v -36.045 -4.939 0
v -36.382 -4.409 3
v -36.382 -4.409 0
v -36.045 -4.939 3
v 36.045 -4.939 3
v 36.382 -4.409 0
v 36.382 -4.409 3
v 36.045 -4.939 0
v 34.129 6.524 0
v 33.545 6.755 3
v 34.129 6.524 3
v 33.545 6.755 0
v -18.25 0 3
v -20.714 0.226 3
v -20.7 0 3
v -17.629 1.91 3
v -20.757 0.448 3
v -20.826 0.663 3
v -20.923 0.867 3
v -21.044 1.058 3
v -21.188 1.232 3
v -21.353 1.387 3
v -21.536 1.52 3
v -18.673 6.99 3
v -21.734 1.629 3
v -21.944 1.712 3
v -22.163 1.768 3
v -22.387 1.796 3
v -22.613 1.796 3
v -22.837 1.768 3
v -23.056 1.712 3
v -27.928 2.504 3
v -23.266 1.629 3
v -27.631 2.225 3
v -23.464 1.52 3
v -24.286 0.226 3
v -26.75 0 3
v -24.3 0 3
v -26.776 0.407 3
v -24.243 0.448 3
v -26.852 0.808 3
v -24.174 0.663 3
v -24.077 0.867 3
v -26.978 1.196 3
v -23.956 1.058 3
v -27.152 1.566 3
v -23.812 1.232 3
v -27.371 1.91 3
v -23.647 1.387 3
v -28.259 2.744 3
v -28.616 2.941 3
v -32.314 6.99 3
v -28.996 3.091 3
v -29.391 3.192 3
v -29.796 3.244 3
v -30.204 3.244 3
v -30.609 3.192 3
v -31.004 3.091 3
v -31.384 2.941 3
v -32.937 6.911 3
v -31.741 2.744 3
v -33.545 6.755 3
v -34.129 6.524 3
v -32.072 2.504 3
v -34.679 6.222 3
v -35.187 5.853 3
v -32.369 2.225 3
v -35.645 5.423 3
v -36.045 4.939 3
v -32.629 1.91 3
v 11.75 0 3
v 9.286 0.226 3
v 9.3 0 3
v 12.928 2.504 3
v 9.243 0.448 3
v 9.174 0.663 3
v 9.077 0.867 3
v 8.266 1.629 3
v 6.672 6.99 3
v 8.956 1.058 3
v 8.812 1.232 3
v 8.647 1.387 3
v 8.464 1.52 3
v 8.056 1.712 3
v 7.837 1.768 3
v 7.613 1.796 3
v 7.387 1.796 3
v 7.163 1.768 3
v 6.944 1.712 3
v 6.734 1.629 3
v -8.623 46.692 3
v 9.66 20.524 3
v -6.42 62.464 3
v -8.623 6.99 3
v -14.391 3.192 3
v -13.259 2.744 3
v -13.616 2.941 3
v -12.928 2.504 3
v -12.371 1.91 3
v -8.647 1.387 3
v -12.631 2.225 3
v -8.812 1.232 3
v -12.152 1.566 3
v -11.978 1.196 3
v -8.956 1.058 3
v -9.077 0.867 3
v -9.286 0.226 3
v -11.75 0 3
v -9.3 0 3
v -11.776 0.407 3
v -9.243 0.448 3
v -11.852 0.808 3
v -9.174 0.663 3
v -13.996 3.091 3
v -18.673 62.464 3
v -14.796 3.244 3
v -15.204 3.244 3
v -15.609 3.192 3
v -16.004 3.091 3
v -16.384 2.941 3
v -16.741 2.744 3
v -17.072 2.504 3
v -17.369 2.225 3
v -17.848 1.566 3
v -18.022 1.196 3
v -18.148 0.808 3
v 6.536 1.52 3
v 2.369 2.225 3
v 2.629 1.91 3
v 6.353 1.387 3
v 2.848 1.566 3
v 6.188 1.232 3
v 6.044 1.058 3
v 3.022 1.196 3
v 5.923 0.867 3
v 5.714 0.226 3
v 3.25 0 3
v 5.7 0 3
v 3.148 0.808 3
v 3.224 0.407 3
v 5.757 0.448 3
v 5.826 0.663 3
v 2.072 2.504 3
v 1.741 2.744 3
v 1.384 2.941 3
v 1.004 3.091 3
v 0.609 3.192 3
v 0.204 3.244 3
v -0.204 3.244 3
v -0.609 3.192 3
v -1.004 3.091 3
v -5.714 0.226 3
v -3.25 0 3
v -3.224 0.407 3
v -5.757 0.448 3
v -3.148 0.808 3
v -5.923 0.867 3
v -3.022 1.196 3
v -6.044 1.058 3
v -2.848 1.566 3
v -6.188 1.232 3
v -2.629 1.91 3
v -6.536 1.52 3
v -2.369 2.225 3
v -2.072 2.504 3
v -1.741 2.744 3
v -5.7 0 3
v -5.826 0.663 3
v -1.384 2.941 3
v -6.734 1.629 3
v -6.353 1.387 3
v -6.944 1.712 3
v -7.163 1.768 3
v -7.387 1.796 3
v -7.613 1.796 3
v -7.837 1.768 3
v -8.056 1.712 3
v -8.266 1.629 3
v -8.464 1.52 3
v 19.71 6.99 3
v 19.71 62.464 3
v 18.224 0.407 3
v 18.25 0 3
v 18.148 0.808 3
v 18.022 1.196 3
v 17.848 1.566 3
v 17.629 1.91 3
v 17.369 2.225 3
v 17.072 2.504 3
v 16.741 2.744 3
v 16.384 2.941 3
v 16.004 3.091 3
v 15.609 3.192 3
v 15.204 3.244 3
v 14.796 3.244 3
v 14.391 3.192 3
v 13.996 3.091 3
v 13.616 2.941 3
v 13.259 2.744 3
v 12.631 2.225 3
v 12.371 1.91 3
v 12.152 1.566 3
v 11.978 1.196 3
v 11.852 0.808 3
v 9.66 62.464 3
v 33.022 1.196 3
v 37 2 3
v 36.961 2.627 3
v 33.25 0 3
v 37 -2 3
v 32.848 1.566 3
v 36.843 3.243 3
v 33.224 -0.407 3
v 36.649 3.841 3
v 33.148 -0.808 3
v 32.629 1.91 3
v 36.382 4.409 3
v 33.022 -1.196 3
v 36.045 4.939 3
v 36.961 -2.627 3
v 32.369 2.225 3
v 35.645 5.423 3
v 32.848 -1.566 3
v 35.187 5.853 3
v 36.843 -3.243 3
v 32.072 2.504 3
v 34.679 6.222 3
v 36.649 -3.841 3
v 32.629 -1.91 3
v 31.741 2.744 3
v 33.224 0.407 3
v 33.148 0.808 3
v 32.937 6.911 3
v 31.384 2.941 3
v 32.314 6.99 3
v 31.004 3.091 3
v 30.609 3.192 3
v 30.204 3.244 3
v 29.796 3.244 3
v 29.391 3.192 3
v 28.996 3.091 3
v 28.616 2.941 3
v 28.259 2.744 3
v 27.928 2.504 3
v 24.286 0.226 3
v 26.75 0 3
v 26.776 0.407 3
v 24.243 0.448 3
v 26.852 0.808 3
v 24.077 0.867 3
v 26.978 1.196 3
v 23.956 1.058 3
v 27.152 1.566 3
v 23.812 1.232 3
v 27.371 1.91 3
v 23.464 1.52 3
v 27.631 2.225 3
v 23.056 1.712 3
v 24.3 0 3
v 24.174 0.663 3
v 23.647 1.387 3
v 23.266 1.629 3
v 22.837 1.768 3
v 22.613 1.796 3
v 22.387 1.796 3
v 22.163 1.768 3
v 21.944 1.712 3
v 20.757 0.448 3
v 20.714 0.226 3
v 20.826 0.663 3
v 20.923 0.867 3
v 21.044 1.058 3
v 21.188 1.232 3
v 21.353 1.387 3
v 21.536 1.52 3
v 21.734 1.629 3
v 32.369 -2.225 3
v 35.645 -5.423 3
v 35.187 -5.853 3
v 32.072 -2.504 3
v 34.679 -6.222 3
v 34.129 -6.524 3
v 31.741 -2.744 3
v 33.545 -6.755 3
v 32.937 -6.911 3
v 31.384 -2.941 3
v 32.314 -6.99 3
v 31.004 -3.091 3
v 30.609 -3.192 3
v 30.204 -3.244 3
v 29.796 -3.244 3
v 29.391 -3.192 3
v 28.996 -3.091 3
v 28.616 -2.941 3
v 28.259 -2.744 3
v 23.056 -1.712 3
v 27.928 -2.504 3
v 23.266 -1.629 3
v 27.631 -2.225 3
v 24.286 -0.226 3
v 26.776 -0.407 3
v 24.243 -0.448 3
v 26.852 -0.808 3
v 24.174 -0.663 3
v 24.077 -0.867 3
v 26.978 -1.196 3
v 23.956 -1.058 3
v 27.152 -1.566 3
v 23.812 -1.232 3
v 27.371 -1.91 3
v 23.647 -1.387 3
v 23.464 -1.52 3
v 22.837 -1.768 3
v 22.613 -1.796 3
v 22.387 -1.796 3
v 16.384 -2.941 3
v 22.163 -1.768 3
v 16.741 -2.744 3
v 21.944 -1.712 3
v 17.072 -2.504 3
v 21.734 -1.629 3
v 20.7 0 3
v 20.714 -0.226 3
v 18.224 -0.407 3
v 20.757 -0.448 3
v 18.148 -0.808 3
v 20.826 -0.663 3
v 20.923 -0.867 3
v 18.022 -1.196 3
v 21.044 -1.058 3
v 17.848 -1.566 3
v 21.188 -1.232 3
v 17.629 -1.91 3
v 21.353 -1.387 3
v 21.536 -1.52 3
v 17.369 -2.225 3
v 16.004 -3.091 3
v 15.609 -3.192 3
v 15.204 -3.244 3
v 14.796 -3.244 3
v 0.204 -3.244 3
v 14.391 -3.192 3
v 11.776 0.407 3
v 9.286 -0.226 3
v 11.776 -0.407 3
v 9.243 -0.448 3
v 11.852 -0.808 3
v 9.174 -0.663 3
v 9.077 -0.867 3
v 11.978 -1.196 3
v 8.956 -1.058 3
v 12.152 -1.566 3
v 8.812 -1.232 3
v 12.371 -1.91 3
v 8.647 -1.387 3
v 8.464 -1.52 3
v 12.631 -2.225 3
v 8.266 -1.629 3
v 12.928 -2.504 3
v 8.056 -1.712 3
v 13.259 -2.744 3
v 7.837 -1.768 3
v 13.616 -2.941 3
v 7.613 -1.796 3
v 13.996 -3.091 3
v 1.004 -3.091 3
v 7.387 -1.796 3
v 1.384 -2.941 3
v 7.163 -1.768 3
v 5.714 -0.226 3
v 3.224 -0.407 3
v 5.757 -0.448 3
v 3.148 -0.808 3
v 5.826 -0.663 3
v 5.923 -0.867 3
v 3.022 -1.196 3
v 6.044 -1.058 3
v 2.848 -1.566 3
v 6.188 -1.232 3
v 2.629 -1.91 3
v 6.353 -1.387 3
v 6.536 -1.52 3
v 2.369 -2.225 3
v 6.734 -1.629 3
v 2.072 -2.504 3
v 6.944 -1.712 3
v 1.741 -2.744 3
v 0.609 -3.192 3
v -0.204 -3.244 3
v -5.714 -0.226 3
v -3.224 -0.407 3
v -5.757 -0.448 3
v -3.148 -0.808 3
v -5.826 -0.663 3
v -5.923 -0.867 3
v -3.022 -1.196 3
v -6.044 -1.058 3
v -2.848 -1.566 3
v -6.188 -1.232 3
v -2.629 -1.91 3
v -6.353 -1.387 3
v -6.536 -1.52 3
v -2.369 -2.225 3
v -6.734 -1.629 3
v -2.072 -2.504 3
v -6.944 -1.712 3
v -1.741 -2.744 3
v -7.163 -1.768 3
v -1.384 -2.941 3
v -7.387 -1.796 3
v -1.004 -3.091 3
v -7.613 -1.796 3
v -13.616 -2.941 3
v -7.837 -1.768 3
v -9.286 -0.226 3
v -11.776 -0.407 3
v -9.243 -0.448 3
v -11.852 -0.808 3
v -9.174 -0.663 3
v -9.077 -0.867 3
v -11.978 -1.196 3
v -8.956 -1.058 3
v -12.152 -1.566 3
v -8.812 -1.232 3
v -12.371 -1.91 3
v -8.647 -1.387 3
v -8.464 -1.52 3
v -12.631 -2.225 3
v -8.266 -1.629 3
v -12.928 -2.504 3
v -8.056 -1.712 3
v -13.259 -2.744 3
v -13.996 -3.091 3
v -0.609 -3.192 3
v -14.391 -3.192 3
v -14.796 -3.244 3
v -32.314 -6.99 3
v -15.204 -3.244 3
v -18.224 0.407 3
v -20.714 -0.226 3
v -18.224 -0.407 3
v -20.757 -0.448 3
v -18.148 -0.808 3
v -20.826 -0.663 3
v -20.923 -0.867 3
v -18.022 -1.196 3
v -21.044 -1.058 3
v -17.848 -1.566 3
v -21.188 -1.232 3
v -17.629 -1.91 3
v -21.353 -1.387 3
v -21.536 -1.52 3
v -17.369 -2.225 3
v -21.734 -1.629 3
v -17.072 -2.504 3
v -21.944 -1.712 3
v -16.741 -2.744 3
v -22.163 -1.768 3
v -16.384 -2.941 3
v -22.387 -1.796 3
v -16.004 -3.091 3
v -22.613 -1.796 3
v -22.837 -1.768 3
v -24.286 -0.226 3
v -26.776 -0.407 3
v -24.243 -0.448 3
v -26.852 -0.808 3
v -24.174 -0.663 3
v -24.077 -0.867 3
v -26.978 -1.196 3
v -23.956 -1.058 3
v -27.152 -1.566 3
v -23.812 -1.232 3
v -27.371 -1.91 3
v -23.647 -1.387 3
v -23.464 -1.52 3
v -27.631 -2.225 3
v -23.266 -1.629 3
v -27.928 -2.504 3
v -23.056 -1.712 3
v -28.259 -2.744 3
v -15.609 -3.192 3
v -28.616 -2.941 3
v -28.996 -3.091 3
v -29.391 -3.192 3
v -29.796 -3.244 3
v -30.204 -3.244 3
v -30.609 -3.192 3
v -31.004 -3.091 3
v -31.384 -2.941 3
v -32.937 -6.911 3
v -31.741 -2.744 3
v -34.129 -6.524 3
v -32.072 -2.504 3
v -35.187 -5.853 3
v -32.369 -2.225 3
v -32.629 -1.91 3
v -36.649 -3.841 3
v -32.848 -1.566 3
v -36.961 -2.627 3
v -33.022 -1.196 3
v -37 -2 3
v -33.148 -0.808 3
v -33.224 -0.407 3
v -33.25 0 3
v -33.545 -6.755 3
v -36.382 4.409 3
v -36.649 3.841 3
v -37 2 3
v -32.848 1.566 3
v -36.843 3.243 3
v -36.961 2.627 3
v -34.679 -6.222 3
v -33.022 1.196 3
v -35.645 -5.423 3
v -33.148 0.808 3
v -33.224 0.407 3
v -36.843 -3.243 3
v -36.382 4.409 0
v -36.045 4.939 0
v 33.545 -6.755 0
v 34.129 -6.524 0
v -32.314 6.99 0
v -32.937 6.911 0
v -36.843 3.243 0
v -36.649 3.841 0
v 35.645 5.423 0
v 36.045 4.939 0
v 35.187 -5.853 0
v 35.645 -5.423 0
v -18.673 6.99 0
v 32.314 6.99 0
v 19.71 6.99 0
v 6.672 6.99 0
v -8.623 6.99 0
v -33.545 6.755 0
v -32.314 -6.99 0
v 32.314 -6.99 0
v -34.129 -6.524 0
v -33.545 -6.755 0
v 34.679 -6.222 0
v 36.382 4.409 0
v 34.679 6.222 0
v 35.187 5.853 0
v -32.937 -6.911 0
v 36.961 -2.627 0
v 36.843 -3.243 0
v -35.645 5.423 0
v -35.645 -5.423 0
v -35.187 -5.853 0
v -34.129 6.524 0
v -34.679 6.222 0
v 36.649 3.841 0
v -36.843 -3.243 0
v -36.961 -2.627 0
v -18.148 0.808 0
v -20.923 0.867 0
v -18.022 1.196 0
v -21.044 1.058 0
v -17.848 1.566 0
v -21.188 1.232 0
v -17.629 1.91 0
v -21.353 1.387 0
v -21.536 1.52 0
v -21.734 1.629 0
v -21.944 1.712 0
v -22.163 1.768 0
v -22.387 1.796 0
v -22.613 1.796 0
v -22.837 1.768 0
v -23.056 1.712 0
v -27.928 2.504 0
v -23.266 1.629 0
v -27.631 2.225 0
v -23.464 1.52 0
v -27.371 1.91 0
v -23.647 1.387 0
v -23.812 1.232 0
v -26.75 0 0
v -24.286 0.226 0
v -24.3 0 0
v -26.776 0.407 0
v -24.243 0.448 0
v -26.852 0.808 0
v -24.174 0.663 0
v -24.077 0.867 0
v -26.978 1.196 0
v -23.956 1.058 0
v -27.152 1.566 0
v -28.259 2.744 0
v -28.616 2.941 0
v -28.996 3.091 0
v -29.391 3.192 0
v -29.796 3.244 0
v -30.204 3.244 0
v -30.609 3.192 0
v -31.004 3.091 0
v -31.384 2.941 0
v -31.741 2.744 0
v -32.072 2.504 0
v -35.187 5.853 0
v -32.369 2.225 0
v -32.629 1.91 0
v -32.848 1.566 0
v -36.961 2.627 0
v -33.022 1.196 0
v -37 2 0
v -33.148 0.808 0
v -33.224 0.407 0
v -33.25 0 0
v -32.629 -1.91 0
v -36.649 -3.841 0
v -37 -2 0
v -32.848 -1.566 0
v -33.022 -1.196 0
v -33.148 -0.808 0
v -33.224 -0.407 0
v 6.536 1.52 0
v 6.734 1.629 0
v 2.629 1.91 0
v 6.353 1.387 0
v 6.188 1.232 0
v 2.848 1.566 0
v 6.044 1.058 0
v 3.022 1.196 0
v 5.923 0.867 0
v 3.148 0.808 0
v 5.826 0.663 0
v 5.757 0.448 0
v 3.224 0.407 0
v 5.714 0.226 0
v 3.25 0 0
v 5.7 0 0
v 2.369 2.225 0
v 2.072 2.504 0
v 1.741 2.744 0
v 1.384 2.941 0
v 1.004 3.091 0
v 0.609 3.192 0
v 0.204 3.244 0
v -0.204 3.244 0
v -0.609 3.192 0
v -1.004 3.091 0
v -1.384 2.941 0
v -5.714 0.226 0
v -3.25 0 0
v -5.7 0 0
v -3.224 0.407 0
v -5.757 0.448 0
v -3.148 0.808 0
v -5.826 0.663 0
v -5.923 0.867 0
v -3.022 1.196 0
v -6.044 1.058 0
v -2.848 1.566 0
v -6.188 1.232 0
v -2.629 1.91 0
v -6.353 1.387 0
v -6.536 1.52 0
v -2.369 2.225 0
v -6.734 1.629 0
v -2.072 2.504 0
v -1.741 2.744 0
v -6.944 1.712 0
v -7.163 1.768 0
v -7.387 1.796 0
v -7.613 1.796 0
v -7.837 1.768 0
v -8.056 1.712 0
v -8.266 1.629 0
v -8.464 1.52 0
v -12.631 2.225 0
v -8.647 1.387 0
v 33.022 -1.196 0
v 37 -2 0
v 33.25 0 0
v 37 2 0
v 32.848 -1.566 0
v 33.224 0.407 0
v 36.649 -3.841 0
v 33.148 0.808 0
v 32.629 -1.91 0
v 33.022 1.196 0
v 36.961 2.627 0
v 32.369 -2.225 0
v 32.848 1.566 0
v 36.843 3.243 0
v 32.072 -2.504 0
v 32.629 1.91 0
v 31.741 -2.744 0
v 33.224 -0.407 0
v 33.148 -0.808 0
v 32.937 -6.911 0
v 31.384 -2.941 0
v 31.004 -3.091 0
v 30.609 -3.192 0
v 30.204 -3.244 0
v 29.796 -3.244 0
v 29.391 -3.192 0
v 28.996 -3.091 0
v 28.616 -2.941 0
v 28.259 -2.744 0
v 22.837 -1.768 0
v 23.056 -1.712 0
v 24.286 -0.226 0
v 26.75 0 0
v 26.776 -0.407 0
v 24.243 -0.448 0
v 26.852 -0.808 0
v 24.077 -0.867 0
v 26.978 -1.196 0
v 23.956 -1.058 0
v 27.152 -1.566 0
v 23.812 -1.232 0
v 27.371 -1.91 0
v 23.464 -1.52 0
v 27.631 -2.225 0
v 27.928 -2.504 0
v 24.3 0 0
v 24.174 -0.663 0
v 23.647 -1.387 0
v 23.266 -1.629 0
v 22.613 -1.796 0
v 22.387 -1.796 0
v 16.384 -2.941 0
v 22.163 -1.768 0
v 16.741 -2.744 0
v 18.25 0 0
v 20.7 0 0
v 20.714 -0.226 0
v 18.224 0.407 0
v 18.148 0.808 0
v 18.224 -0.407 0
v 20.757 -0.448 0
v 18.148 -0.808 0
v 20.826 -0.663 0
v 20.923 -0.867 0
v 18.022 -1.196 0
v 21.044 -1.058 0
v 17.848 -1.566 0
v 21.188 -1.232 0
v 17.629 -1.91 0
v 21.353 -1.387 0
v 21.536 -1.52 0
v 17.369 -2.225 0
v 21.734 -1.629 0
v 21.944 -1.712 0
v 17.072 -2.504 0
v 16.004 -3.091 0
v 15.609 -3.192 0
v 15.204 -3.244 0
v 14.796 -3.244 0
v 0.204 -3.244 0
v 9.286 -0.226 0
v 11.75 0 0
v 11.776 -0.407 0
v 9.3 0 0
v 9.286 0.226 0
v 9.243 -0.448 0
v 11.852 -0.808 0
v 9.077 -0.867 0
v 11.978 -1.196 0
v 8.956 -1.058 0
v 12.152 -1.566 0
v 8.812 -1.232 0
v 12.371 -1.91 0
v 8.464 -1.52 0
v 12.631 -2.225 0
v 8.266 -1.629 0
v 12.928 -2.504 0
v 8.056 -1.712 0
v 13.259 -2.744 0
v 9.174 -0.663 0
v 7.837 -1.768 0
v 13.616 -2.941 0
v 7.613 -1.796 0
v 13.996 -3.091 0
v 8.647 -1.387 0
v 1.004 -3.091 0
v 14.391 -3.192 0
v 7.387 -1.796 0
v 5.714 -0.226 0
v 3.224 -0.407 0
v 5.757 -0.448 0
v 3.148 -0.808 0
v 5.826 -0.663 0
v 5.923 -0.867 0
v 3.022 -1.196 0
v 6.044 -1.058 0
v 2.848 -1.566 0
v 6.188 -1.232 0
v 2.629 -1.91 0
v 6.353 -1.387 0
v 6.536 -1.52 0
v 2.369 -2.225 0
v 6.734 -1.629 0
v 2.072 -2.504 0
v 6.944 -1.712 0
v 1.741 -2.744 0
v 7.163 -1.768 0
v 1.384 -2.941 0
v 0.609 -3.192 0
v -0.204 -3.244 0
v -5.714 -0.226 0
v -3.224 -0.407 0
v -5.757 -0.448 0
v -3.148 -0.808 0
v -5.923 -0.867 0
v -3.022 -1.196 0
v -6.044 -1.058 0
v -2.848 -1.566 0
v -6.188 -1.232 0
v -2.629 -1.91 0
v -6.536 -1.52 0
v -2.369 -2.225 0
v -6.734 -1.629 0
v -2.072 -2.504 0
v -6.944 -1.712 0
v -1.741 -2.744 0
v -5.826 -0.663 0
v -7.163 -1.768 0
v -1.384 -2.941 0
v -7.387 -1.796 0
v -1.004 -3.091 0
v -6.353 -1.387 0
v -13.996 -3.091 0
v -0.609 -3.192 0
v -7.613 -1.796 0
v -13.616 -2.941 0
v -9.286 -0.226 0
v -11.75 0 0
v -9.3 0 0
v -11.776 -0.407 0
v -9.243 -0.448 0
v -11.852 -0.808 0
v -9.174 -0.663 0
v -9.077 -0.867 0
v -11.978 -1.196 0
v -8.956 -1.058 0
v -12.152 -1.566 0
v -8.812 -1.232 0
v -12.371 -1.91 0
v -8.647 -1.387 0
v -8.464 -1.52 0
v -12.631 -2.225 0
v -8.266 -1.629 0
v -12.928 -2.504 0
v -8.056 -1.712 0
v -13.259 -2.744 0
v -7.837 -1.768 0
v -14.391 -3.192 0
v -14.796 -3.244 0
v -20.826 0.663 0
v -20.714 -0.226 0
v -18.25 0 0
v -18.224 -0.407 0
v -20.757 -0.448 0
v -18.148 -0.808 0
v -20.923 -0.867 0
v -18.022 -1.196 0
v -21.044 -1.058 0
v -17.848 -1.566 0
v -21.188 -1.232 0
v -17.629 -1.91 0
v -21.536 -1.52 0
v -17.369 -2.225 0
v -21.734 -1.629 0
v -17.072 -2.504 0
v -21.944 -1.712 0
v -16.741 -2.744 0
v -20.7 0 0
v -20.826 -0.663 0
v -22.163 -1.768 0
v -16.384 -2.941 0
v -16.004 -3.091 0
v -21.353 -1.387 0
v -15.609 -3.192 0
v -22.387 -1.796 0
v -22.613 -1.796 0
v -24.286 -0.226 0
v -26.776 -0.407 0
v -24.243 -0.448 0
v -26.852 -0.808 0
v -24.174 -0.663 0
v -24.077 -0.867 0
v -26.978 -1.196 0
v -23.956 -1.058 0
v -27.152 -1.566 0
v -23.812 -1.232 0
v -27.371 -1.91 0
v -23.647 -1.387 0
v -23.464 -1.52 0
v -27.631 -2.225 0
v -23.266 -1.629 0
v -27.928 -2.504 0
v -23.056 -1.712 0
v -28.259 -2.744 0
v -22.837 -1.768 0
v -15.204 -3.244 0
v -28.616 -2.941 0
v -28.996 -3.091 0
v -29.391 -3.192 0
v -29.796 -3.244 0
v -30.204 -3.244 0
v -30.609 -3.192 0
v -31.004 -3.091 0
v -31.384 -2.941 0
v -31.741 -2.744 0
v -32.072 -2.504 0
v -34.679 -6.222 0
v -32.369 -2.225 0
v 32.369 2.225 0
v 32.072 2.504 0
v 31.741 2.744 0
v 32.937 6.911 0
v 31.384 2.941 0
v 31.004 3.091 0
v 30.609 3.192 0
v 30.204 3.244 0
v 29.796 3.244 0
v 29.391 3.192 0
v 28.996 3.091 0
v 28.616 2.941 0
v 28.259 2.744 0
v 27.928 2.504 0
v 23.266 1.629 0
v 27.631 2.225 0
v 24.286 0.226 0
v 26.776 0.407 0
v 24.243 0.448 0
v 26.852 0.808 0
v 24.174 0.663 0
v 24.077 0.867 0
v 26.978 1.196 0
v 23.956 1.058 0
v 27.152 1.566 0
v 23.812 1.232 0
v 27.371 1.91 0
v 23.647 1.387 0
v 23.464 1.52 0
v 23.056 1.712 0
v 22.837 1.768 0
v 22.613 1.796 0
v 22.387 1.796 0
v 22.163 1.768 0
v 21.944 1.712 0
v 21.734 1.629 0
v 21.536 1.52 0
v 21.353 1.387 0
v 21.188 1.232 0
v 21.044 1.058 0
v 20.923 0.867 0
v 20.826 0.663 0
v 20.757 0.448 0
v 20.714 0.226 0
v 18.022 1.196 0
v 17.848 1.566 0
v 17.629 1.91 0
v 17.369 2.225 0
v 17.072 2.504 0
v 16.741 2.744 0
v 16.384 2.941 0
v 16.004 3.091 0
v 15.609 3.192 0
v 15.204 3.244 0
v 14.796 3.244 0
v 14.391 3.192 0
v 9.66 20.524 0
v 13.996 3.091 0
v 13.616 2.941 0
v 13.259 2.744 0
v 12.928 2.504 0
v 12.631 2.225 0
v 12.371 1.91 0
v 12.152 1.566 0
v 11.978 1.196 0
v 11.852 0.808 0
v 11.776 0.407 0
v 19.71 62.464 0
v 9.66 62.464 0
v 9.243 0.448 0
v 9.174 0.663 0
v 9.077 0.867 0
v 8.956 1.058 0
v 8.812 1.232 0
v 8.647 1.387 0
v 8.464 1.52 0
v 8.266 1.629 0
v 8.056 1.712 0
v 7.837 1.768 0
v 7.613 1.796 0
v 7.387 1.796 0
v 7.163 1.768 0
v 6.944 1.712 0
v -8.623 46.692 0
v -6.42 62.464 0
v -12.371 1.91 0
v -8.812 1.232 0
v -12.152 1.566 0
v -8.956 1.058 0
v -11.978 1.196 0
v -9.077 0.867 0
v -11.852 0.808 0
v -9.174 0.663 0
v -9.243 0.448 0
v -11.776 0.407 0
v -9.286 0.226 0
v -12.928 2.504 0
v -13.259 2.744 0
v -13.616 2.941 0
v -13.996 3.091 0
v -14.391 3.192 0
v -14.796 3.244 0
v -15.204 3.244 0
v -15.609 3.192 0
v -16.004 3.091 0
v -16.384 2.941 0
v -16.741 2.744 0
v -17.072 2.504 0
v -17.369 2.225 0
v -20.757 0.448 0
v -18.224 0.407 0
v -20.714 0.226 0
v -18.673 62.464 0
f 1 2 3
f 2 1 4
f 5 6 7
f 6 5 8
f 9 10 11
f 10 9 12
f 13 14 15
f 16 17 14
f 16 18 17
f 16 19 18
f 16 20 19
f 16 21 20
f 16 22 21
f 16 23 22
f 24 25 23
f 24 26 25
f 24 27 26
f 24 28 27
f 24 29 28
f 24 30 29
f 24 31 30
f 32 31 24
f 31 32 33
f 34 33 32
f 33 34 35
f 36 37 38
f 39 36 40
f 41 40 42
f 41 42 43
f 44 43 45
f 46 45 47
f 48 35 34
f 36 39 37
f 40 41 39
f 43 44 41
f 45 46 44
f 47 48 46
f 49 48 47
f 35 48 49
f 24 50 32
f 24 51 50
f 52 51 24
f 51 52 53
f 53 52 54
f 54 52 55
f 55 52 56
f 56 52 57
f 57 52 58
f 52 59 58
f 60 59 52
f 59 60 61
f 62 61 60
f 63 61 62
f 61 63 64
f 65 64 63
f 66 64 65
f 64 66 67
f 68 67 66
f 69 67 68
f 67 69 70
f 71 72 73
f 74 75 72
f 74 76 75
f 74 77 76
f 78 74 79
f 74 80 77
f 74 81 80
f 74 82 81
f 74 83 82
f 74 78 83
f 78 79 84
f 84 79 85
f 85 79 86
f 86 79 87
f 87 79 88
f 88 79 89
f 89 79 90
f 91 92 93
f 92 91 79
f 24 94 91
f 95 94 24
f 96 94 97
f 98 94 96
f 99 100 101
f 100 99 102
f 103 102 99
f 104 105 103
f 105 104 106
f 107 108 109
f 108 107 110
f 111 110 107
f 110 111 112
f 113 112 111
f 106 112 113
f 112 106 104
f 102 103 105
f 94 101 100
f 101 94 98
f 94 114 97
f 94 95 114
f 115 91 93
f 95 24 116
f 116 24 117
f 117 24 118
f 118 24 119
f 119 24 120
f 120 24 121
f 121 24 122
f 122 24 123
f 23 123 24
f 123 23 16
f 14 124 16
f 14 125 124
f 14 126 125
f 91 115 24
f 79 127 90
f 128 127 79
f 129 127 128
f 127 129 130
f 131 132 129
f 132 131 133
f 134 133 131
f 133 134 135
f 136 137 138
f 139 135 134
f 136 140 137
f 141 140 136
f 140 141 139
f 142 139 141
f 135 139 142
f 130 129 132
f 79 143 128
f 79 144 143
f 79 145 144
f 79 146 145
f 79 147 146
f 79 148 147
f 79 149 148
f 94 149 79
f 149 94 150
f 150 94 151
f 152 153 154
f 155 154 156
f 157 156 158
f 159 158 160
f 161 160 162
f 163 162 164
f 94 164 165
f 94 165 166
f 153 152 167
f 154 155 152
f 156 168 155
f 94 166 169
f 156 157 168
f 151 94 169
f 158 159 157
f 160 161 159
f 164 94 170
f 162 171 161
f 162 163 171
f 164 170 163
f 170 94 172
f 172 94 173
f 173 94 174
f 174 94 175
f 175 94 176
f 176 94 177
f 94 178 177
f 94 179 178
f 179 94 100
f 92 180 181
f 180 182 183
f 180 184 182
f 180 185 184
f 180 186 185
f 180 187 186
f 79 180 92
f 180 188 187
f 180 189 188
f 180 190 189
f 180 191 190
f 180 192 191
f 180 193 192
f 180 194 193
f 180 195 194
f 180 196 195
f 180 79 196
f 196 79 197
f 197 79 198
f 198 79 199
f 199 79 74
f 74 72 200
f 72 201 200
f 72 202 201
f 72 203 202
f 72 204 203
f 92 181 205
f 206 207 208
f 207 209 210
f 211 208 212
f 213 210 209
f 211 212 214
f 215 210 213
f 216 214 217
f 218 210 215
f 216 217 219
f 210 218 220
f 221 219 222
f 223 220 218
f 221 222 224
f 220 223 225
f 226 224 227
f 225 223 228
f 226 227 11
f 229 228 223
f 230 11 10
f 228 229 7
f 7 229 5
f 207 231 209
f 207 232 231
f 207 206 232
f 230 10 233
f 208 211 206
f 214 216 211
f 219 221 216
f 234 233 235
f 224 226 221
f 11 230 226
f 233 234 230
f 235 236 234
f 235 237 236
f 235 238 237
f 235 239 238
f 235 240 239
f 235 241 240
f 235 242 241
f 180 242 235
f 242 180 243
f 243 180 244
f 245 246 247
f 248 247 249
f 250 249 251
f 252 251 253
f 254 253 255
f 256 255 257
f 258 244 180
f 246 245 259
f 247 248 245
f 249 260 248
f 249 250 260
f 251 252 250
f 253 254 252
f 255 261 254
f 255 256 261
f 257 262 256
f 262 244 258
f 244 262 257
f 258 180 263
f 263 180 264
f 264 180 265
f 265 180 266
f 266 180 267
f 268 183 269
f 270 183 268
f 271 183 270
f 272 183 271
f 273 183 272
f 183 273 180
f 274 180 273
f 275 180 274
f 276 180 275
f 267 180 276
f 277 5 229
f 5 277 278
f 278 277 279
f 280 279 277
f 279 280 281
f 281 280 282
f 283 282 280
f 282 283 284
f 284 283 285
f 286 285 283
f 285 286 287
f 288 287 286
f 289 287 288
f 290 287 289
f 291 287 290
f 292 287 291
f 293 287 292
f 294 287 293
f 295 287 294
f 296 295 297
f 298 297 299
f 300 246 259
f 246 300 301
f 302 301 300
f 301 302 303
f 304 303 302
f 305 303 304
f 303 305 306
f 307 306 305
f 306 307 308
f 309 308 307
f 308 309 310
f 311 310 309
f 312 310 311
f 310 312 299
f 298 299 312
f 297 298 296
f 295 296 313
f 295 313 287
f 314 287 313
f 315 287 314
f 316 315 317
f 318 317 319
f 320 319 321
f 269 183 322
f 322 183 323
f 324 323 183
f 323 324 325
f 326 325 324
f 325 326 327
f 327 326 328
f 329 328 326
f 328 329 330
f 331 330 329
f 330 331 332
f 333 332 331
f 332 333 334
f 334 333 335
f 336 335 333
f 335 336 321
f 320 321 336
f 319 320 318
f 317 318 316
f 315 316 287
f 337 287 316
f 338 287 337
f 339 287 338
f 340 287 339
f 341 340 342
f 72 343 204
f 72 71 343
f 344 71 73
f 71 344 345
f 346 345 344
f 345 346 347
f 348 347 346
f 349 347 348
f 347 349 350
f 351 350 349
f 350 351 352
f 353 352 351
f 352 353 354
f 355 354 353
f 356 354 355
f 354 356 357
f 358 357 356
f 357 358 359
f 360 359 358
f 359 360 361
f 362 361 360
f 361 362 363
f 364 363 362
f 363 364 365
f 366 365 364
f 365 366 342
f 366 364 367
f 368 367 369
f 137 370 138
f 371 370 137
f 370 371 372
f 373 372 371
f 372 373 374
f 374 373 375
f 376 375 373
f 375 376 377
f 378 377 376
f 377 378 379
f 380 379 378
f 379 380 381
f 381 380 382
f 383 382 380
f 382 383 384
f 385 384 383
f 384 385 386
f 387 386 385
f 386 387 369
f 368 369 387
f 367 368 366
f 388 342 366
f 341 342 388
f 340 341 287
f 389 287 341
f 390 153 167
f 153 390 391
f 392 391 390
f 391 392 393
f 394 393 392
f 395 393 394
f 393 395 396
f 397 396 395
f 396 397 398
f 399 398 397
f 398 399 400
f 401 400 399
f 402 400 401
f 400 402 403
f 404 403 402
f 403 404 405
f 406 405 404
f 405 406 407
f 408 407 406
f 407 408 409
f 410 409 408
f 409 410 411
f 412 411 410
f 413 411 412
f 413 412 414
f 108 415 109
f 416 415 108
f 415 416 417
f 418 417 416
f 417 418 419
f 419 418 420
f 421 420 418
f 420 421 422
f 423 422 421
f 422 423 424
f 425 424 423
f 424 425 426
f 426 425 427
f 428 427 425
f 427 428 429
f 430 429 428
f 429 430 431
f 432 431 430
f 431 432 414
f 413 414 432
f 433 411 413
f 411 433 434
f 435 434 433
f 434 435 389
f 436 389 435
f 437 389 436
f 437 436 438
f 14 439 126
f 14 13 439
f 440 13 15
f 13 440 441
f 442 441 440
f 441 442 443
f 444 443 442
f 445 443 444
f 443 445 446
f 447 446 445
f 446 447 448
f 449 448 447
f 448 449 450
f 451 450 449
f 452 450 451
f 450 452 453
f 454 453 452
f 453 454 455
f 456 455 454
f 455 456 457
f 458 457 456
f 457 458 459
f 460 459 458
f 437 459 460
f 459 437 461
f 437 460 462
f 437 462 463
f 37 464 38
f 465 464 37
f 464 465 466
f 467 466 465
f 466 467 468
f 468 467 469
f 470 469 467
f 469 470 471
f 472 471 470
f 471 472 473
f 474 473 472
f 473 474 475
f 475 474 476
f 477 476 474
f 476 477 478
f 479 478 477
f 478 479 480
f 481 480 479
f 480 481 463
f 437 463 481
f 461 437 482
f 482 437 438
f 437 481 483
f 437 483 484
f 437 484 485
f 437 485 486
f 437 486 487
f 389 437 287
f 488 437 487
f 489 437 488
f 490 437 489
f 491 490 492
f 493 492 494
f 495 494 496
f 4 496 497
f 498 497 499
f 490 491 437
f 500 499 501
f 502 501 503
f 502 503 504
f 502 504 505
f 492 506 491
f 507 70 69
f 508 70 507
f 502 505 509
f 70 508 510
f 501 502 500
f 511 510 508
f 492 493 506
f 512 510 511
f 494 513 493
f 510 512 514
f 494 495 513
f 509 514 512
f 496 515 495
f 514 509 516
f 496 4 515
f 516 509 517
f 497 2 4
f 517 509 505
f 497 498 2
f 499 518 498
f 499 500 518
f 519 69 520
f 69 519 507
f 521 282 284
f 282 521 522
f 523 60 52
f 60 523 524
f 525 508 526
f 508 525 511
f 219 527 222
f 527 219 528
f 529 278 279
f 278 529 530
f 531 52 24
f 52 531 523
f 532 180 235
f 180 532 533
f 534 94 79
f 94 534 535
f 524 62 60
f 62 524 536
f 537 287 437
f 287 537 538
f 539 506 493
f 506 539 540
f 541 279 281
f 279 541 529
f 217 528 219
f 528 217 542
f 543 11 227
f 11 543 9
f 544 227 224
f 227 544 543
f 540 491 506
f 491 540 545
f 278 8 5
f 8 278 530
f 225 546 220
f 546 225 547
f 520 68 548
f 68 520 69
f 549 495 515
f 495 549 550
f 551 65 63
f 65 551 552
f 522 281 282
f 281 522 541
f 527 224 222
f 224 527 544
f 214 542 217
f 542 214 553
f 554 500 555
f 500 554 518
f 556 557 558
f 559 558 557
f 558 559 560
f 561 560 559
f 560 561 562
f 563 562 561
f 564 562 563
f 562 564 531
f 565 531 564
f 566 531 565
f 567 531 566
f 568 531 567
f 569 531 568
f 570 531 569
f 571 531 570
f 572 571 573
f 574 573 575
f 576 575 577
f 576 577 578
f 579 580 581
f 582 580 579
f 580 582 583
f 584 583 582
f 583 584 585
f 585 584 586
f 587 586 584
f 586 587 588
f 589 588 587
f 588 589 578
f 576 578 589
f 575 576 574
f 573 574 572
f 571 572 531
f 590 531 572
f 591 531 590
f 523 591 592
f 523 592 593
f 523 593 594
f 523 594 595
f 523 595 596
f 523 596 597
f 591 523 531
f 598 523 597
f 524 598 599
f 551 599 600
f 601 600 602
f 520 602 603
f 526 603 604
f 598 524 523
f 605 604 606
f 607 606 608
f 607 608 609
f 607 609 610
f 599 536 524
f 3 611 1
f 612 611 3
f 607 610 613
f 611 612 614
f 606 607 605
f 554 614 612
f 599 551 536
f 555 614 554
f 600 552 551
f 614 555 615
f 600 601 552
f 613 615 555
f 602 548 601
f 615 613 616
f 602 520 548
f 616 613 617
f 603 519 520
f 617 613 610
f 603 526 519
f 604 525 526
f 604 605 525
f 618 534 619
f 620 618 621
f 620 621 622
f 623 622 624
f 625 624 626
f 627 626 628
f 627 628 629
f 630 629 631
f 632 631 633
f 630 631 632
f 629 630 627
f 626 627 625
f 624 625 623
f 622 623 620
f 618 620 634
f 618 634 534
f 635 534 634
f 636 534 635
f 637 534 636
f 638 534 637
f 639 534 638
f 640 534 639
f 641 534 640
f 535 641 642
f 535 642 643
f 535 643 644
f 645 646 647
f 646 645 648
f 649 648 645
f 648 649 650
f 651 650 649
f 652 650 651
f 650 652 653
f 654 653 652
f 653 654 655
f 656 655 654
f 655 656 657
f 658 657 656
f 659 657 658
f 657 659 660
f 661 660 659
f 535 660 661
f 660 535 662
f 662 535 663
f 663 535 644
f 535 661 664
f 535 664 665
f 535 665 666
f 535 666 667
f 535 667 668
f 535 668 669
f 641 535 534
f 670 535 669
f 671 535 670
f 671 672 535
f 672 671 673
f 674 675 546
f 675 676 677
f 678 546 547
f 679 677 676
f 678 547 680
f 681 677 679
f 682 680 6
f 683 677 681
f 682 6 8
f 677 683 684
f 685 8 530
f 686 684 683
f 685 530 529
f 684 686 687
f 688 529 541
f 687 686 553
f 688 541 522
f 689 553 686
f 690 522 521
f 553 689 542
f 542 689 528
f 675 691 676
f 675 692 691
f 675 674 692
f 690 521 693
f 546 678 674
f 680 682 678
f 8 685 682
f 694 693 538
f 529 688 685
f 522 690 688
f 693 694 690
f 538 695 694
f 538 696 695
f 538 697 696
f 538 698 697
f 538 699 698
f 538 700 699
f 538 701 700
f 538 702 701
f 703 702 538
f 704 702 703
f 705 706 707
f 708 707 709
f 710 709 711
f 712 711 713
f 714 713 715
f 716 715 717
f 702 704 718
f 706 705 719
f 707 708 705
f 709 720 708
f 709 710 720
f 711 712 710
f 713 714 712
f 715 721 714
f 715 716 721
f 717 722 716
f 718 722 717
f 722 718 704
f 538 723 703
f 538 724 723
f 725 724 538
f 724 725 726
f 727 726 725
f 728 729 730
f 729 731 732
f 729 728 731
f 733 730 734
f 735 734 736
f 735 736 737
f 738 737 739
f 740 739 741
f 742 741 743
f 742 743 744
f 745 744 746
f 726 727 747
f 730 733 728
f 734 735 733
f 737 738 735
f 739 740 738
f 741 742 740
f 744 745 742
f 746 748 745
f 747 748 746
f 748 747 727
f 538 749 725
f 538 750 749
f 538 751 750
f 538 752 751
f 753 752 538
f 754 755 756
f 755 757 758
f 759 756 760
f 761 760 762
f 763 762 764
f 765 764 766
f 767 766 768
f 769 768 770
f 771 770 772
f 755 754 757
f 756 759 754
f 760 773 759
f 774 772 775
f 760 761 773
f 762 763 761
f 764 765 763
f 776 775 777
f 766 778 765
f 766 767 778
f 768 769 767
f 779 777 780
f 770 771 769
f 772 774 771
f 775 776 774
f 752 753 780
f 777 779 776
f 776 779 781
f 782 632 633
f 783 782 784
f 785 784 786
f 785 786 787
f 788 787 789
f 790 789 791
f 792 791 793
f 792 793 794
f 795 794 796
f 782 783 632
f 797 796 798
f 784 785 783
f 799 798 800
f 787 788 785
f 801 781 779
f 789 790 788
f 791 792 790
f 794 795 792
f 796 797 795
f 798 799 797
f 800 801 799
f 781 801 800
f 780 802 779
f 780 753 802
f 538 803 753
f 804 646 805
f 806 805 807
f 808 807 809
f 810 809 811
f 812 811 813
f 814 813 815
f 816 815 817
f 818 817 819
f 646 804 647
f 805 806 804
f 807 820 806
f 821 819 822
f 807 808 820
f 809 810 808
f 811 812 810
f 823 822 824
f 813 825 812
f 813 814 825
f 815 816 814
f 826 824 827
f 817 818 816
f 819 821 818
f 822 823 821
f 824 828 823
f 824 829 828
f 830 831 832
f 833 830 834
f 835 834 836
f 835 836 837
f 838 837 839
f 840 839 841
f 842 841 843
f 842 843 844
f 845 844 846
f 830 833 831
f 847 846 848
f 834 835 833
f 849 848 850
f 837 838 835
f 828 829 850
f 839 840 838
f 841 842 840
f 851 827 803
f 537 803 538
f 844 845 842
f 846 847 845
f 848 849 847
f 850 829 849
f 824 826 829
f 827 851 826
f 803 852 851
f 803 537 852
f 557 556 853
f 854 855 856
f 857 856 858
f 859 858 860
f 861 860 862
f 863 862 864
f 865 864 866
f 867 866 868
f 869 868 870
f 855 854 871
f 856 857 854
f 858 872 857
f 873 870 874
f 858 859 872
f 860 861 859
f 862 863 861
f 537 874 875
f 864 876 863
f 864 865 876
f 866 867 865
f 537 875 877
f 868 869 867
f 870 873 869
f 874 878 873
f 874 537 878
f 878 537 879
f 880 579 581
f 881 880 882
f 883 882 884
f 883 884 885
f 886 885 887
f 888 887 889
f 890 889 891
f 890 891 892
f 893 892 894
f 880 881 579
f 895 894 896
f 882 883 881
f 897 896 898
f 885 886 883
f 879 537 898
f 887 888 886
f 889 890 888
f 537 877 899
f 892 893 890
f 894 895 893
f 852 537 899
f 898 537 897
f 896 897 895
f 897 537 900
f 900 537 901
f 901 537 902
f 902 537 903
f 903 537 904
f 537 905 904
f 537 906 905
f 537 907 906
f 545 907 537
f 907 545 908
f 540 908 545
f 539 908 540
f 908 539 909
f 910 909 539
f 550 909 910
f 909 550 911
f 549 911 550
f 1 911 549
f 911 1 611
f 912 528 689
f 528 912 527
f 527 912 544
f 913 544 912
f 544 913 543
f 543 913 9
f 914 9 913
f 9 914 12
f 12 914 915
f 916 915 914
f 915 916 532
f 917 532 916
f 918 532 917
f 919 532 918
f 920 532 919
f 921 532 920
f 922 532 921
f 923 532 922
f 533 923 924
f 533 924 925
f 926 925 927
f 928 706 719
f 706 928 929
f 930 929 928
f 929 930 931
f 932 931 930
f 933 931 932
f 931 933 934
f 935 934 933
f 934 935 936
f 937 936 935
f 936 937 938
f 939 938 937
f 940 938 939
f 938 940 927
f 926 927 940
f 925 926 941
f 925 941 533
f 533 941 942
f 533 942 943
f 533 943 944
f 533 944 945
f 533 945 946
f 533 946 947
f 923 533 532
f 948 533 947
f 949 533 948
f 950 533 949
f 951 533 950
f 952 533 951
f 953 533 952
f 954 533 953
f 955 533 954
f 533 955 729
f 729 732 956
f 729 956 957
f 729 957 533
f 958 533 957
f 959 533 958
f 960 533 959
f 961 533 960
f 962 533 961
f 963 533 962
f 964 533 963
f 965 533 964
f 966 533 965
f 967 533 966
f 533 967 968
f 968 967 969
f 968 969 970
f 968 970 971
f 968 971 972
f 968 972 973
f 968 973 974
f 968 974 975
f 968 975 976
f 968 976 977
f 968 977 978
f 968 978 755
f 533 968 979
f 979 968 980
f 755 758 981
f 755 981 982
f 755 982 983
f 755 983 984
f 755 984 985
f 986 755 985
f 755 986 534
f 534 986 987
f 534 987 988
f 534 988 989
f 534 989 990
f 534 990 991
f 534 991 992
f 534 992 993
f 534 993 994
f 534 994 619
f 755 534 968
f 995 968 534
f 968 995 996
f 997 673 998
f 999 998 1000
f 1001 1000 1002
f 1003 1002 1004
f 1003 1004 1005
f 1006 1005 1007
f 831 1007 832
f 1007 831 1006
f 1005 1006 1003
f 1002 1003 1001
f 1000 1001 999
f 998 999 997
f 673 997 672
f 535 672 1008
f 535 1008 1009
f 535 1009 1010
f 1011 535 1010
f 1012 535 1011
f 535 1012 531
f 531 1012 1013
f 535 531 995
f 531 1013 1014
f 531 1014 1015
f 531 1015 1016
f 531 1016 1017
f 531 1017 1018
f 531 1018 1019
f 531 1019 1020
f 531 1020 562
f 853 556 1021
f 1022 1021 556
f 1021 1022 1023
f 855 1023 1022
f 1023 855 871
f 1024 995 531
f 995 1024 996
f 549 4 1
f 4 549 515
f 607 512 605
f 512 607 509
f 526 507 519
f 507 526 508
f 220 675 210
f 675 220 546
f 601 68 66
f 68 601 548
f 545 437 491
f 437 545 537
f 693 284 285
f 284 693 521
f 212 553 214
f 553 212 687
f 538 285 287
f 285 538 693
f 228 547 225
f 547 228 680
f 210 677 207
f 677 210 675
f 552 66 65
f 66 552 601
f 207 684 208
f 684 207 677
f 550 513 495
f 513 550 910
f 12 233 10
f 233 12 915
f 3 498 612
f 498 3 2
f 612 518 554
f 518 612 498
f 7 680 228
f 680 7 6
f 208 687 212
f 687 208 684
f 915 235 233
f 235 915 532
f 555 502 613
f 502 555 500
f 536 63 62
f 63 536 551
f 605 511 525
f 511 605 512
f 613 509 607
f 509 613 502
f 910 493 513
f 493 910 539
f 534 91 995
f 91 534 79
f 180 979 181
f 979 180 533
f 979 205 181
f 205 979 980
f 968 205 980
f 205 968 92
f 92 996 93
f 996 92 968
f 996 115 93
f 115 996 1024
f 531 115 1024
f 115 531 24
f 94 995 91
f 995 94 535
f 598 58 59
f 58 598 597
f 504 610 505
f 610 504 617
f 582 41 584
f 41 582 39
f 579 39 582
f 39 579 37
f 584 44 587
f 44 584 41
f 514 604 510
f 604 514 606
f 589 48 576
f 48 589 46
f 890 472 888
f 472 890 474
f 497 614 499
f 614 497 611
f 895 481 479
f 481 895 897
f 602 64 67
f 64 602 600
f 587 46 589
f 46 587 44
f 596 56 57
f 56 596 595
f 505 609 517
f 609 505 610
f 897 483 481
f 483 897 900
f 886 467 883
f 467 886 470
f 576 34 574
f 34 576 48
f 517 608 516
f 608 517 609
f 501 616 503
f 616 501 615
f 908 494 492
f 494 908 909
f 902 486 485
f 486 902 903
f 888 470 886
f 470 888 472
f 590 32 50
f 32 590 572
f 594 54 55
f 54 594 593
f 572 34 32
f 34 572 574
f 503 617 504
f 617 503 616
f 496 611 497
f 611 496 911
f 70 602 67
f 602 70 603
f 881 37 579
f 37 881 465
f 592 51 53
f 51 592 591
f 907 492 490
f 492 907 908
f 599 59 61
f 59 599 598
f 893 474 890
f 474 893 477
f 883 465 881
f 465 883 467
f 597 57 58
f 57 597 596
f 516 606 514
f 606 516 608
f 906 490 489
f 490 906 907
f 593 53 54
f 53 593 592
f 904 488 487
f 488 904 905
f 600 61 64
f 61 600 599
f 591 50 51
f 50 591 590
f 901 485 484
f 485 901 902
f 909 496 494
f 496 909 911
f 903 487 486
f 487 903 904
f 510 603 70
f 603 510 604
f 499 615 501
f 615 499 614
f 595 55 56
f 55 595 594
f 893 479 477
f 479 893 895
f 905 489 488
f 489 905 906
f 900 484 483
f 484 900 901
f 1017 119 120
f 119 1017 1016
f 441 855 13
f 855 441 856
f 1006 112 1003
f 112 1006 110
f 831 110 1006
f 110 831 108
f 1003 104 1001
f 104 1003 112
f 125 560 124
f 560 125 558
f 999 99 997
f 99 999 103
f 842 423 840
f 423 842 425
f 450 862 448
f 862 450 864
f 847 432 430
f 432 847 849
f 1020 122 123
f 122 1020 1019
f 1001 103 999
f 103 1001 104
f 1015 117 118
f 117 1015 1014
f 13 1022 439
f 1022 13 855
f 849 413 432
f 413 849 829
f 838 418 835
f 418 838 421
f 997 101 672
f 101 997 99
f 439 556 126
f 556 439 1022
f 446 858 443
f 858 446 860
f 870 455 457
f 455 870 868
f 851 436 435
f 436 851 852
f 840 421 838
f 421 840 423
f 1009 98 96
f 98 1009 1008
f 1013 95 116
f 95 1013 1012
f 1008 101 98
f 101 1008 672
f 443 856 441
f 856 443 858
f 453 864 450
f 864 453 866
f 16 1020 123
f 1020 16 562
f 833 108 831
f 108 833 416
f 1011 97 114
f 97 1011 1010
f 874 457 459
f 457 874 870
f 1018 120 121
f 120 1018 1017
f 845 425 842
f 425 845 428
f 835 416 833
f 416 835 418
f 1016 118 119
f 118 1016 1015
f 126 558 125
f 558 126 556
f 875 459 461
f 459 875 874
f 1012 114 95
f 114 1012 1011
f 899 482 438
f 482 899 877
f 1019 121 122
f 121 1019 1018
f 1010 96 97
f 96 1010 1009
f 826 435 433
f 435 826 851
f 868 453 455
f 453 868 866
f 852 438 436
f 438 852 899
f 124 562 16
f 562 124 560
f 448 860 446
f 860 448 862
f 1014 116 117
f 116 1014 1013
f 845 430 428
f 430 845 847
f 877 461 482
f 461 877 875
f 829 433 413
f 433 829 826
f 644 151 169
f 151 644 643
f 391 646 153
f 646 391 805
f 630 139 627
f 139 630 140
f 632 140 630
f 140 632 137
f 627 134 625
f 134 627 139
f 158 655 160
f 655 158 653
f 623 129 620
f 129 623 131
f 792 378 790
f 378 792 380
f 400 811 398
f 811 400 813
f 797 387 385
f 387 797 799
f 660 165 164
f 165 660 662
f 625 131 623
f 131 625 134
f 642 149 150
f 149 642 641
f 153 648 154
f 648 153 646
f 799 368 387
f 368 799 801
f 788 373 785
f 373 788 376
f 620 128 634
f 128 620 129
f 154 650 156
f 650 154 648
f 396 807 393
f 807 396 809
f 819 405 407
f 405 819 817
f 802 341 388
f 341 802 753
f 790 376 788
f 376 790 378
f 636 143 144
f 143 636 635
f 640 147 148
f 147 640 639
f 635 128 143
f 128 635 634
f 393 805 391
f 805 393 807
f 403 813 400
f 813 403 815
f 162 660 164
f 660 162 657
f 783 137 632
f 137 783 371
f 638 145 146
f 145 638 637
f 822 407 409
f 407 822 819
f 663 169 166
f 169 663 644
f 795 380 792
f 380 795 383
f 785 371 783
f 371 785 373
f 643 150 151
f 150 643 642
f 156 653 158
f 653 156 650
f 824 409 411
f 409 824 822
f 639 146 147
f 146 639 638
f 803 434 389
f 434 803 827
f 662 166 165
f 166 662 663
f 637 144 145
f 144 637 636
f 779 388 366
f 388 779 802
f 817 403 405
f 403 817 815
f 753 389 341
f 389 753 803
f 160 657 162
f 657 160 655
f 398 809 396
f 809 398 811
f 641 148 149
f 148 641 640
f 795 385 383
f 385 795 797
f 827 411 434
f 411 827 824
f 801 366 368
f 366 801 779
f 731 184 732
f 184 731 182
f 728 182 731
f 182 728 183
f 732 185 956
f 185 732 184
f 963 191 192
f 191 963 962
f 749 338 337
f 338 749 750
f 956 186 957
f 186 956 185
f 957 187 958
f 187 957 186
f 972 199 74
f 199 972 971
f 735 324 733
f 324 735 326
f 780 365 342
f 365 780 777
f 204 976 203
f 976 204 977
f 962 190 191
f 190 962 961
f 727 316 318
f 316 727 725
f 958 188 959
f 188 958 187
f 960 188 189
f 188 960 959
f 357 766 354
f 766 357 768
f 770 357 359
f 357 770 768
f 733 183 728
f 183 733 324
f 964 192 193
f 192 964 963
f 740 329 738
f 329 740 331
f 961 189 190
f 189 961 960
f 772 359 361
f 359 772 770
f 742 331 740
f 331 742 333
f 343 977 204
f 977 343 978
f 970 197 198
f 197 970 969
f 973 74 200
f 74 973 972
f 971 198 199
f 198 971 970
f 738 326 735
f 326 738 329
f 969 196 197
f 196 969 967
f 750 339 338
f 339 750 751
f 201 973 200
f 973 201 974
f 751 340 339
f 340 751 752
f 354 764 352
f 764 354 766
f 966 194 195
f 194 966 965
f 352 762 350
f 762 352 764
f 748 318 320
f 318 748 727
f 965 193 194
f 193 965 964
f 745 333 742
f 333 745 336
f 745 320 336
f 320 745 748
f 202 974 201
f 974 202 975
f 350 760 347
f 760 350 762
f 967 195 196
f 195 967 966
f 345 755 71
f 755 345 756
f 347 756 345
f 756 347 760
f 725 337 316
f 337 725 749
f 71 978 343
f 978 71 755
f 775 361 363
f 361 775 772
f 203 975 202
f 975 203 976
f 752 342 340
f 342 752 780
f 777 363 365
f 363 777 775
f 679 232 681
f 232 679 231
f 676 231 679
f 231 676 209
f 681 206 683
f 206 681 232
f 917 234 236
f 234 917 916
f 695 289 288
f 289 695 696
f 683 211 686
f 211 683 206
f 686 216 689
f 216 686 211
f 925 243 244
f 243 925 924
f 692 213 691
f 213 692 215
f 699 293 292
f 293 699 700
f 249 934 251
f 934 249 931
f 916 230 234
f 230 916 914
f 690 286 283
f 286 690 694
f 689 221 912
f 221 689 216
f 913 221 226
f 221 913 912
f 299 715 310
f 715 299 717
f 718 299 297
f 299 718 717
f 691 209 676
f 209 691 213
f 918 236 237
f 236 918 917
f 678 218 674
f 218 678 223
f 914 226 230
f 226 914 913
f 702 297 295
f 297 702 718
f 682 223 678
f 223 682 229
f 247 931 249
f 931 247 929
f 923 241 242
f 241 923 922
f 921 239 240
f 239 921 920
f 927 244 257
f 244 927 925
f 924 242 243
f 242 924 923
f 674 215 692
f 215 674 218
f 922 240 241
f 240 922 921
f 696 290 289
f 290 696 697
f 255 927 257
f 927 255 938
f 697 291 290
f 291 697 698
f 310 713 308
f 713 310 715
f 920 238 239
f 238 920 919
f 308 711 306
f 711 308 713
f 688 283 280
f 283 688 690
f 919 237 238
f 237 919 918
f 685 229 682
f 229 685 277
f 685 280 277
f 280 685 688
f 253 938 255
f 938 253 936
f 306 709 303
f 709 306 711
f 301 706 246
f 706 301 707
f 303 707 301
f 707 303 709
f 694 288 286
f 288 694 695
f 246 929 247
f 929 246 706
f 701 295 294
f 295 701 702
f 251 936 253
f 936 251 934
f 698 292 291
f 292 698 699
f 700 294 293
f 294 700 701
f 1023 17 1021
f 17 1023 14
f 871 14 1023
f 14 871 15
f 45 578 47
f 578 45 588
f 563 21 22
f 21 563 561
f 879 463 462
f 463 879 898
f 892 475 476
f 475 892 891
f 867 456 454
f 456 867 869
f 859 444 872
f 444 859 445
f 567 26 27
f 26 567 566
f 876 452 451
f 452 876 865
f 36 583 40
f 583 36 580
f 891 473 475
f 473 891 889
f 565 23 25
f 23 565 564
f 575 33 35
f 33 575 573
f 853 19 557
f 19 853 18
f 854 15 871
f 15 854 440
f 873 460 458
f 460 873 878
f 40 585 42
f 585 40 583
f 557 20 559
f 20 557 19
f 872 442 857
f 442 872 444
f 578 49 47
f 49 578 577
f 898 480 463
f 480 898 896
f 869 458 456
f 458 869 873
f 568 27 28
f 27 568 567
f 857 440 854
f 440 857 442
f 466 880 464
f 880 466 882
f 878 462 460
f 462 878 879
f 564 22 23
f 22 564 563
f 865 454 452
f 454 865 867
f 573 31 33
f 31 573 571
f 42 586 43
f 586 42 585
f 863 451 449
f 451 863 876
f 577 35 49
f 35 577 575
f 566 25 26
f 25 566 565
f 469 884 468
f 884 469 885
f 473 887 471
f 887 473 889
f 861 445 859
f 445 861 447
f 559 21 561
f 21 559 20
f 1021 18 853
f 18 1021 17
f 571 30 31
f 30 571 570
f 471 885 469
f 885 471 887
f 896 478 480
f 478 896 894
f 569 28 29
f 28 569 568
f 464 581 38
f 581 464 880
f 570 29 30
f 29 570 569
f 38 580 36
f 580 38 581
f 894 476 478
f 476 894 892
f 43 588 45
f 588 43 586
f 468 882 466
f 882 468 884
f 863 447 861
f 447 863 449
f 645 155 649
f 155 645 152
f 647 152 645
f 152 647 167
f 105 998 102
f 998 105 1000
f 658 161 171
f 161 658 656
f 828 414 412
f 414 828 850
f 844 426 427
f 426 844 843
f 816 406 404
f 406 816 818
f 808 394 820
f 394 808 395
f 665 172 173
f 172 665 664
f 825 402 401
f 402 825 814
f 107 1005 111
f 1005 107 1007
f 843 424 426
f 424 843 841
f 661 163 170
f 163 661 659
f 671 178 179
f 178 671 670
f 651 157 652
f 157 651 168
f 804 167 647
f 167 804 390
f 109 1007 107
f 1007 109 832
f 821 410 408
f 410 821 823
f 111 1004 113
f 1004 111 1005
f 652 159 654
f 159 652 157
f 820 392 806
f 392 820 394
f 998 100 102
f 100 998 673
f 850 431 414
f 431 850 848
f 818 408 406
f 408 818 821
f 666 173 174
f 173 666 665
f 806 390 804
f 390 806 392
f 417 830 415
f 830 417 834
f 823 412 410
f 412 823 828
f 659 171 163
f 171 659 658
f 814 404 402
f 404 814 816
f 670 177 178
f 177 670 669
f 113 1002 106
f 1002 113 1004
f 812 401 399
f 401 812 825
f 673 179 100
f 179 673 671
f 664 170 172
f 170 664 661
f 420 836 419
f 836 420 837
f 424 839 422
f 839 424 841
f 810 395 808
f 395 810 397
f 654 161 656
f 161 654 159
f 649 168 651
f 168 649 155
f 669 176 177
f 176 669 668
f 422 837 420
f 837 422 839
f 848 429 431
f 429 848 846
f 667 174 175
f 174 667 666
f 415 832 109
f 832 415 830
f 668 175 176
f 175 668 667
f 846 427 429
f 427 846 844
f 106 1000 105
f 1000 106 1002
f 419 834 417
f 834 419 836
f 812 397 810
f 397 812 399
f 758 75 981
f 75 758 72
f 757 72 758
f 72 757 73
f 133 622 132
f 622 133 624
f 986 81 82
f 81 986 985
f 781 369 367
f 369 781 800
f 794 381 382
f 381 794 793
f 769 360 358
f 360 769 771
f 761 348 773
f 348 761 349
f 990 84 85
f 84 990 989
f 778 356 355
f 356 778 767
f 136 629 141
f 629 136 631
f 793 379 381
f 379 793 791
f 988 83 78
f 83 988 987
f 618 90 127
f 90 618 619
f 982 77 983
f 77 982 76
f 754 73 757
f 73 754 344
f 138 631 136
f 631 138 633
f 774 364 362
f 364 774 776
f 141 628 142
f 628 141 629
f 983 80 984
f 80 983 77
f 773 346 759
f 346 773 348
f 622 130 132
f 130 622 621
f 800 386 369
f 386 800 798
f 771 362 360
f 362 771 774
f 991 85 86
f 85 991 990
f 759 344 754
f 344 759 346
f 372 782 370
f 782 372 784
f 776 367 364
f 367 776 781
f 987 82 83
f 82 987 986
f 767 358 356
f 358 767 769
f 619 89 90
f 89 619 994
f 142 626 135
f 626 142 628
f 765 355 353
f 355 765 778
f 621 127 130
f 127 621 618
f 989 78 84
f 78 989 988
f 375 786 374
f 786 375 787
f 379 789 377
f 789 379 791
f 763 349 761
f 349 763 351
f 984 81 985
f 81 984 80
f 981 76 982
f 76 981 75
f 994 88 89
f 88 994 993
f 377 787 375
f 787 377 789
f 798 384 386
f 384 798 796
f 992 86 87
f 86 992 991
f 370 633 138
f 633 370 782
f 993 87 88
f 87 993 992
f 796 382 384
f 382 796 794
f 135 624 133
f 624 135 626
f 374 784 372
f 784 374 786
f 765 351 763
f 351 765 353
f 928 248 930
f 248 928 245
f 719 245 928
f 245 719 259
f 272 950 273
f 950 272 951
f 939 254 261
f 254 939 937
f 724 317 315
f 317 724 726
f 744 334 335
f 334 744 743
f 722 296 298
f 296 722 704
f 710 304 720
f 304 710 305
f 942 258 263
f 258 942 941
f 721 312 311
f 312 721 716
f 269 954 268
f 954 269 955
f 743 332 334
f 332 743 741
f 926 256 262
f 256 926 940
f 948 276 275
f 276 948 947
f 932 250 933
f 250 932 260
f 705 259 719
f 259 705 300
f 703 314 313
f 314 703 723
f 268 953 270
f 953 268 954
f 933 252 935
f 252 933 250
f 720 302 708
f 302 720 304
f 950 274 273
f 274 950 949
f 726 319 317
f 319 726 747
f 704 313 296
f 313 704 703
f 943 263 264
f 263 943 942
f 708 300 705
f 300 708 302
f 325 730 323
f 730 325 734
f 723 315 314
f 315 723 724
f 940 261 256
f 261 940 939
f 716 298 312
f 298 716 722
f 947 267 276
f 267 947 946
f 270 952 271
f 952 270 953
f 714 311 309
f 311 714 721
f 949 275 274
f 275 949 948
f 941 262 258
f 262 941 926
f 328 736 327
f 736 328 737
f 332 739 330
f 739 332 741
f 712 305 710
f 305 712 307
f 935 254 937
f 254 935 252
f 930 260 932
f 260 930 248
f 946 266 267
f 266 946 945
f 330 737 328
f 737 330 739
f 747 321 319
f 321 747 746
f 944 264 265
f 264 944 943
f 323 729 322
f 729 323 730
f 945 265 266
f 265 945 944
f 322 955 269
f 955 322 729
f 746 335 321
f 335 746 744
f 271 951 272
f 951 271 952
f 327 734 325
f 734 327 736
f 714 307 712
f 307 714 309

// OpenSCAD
$fn = 50;


difference() {
	union() {
		hull() {
			translate(v = [-32.0000000000, 2.0000000000, 0]) {
				cylinder(h = 3, r = 5);
			}
			translate(v = [32.0000000000, 2.0000000000, 0]) {
				cylinder(h = 3, r = 5);
			}
			translate(v = [-32.0000000000, -2.0000000000, 0]) {
				cylinder(h = 3, r = 5);
			}
			translate(v = [32.0000000000, -2.0000000000, 0]) {
				cylinder(h = 3, r = 5);
			}
		}
		translate(v = [0, 61.1111111111, 0]) {
			linear_extrude(height = 3) {
				text(font = "DejaVu Sans Mono:style=Bold", halign = "center", size = 57.0000000000, text = "N", valign = "top");
			}
		}
	}
	union() {
		translate(v = [-30.0000000000, 0.0000000000, 0]) {
			translate(v = [0, 0, -100]) {
				cylinder(h = 200, r = 3.2500000000);
			}
		}
		translate(v = [-15.0000000000, 0.0000000000, 0]) {
			translate(v = [0, 0, -100]) {
				cylinder(h = 200, r = 3.2500000000);
			}
		}
		translate(v = [0, 0, -100]) {
			cylinder(h = 200, r = 3.2500000000);
		}
		translate(v = [15.0000000000, 0.0000000000, 0]) {
			translate(v = [0, 0, -100]) {
				cylinder(h = 200, r = 3.2500000000);
			}
		}
		translate(v = [30.0000000000, 0.0000000000, 0]) {
			translate(v = [0, 0, -100]) {
				cylinder(h = 200, r = 3.2500000000);
			}
		}
		translate(v = [-30.0000000000, 0.0000000000, 0]) {
			translate(v = [0, 0, -100]) {
				cylinder(h = 200, r = 1.8000000000);
			}
		}
		translate(v = [-22.5000000000, 0.0000000000, 0]) {
			translate(v = [0, 0, -100]) {
				cylinder(h = 200, r = 1.8000000000);
			}
		}
		translate(v = [-15.0000000000, 0.0000000000, 0]) {
			translate(v = [0, 0, -100]) {
				cylinder(h = 200, r = 1.8000000000);
			}
		}
		translate(v = [-7.5000000000, 0.0000000000, 0]) {
			translate(v = [0, 0, -100]) {
				cylinder(h = 200, r = 1.8000000000);
			}
		}
		translate(v = [0, 0, -100]) {
			cylinder(h = 200, r = 1.8000000000);
		}
		translate(v = [7.5000000000, 0.0000000000, 0]) {
			translate(v = [0, 0, -100]) {
				cylinder(h = 200, r = 1.8000000000);
			}
		}
		translate(v = [15.0000000000, 0.0000000000, 0]) {
			translate(v = [0, 0, -100]) {
				cylinder(h = 200, r = 1.8000000000);
			}
		}
		translate(v = [22.5000000000, 0.0000000000, 0]) {
			translate(v = [0, 0, -100]) {
				cylinder(h = 200, r = 1.8000000000);
			}
		}
		translate(v = [30.0000000000, 0.0000000000, 0]) {
			translate(v = [0, 0, -100]) {
				cylinder(h = 200, r = 1.8000000000);
			}
		}
	}
}
